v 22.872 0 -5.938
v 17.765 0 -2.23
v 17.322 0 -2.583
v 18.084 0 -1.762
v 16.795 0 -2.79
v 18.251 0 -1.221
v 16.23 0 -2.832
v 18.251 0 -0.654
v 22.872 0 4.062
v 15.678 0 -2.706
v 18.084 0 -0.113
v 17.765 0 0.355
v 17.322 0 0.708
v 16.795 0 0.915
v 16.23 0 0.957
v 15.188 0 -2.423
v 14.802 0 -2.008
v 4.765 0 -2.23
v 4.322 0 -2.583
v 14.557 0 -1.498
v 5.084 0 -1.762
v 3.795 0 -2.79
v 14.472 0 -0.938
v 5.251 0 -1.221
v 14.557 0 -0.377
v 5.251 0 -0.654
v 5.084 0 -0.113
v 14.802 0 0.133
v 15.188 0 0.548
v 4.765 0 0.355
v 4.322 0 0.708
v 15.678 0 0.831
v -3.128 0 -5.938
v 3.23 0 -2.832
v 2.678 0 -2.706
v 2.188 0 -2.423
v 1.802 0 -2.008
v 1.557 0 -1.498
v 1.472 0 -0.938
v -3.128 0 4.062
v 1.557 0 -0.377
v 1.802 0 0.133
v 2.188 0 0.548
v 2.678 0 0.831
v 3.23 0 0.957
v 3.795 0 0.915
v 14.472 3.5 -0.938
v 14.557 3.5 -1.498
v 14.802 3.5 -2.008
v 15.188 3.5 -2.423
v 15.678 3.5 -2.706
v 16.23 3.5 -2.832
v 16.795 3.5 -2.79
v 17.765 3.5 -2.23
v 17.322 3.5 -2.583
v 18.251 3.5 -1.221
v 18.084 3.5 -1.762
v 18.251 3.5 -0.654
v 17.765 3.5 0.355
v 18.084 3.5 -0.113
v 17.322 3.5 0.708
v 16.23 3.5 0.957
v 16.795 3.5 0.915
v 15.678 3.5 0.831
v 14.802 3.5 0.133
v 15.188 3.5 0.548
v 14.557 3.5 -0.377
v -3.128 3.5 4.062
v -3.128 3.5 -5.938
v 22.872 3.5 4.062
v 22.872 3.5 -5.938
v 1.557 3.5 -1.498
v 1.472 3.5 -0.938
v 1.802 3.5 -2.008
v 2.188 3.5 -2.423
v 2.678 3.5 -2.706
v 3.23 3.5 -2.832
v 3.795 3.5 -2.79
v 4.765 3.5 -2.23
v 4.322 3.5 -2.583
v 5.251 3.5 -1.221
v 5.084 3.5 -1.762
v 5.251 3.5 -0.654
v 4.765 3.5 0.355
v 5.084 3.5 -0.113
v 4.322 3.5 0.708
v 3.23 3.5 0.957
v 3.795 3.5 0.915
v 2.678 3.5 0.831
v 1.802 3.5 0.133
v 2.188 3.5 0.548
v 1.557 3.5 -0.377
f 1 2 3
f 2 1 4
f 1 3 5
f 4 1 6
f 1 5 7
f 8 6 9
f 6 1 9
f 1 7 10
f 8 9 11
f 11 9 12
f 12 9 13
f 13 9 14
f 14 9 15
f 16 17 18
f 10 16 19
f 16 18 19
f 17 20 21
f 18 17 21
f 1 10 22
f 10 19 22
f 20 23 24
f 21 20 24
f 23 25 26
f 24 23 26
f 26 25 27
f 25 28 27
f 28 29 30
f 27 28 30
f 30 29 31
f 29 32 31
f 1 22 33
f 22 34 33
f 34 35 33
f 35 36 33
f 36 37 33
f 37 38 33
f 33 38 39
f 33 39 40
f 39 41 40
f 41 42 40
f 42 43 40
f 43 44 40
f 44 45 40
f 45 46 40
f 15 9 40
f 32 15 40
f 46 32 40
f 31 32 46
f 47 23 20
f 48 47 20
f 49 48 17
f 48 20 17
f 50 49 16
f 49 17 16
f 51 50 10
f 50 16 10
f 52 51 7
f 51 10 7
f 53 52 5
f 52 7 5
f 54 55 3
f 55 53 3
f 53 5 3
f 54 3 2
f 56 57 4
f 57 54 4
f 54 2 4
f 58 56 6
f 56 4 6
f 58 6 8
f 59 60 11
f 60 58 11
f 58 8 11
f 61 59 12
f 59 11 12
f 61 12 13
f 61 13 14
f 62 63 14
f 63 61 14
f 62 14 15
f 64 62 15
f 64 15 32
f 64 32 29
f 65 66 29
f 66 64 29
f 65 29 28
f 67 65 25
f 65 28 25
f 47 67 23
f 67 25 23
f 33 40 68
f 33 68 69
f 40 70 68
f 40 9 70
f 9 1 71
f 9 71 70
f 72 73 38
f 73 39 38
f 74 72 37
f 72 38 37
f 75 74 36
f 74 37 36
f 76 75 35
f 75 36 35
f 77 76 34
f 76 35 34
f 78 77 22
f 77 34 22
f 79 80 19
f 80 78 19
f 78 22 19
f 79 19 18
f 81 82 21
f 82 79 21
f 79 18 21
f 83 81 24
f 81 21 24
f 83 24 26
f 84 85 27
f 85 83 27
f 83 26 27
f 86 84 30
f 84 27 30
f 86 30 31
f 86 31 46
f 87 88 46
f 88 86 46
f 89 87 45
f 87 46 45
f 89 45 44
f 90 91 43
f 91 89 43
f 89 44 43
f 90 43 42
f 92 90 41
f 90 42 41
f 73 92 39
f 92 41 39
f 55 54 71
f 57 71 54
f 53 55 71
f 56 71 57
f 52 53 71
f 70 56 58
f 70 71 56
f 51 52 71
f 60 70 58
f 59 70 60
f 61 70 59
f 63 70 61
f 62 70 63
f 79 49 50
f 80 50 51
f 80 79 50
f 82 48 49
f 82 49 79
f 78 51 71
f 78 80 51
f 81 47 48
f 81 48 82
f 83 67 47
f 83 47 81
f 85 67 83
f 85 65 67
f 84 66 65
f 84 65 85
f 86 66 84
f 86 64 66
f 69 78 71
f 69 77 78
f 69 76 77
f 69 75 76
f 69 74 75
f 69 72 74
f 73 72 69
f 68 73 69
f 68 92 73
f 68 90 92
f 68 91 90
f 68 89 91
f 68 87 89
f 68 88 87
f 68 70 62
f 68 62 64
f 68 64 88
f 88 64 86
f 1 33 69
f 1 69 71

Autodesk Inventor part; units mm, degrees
ref_plane "YZ Plane" through (0, 0, 0) normal (1, 0, 0) x (0, 1, 0)
ref_plane "XZ Plane" through (0, 0, 0) normal (0, 1, 0) x (-1, 0, 0)
ref_plane "XY Plane" through (0, 0, 0) normal (0, 0, 1) x (1, 0, 0)
sketch "Sketch1" plane through (0, 0, 0) normal (0, 1, 0) x (-1, 0, 0)
  line L0 (3.1278, 4.0625) -> (3.1278, -5.9375)
  line L1 (3.1278, -5.9375) -> (-22.8722, -5.9375)
  line L2 (-22.8722, -5.9375) -> (-22.8722, 4.0625)
  line L3 (-22.8722, 4.0625) -> (3.1278, 4.0625)
  circle A0 centre (-3.3722, -0.9375) radius 1.9
  line L4 (-9.8722, -5.9375) -> (-9.8722, 8.6537)
  circle A1 centre (-16.3722, -0.9375) radius 1.9
  point P0 (0, 0)
  dimension "d0" = 10
  dimension "d1" = 26
  dimension "d2" = 3.8
  dimension "d4" = 6.5
  dimension "d5" = 6.5
  dimension "d6" = 13
extrude "Extrusion1" add sketch "Sketch1" along normal blind 3.5
properties part number "prepoj"
